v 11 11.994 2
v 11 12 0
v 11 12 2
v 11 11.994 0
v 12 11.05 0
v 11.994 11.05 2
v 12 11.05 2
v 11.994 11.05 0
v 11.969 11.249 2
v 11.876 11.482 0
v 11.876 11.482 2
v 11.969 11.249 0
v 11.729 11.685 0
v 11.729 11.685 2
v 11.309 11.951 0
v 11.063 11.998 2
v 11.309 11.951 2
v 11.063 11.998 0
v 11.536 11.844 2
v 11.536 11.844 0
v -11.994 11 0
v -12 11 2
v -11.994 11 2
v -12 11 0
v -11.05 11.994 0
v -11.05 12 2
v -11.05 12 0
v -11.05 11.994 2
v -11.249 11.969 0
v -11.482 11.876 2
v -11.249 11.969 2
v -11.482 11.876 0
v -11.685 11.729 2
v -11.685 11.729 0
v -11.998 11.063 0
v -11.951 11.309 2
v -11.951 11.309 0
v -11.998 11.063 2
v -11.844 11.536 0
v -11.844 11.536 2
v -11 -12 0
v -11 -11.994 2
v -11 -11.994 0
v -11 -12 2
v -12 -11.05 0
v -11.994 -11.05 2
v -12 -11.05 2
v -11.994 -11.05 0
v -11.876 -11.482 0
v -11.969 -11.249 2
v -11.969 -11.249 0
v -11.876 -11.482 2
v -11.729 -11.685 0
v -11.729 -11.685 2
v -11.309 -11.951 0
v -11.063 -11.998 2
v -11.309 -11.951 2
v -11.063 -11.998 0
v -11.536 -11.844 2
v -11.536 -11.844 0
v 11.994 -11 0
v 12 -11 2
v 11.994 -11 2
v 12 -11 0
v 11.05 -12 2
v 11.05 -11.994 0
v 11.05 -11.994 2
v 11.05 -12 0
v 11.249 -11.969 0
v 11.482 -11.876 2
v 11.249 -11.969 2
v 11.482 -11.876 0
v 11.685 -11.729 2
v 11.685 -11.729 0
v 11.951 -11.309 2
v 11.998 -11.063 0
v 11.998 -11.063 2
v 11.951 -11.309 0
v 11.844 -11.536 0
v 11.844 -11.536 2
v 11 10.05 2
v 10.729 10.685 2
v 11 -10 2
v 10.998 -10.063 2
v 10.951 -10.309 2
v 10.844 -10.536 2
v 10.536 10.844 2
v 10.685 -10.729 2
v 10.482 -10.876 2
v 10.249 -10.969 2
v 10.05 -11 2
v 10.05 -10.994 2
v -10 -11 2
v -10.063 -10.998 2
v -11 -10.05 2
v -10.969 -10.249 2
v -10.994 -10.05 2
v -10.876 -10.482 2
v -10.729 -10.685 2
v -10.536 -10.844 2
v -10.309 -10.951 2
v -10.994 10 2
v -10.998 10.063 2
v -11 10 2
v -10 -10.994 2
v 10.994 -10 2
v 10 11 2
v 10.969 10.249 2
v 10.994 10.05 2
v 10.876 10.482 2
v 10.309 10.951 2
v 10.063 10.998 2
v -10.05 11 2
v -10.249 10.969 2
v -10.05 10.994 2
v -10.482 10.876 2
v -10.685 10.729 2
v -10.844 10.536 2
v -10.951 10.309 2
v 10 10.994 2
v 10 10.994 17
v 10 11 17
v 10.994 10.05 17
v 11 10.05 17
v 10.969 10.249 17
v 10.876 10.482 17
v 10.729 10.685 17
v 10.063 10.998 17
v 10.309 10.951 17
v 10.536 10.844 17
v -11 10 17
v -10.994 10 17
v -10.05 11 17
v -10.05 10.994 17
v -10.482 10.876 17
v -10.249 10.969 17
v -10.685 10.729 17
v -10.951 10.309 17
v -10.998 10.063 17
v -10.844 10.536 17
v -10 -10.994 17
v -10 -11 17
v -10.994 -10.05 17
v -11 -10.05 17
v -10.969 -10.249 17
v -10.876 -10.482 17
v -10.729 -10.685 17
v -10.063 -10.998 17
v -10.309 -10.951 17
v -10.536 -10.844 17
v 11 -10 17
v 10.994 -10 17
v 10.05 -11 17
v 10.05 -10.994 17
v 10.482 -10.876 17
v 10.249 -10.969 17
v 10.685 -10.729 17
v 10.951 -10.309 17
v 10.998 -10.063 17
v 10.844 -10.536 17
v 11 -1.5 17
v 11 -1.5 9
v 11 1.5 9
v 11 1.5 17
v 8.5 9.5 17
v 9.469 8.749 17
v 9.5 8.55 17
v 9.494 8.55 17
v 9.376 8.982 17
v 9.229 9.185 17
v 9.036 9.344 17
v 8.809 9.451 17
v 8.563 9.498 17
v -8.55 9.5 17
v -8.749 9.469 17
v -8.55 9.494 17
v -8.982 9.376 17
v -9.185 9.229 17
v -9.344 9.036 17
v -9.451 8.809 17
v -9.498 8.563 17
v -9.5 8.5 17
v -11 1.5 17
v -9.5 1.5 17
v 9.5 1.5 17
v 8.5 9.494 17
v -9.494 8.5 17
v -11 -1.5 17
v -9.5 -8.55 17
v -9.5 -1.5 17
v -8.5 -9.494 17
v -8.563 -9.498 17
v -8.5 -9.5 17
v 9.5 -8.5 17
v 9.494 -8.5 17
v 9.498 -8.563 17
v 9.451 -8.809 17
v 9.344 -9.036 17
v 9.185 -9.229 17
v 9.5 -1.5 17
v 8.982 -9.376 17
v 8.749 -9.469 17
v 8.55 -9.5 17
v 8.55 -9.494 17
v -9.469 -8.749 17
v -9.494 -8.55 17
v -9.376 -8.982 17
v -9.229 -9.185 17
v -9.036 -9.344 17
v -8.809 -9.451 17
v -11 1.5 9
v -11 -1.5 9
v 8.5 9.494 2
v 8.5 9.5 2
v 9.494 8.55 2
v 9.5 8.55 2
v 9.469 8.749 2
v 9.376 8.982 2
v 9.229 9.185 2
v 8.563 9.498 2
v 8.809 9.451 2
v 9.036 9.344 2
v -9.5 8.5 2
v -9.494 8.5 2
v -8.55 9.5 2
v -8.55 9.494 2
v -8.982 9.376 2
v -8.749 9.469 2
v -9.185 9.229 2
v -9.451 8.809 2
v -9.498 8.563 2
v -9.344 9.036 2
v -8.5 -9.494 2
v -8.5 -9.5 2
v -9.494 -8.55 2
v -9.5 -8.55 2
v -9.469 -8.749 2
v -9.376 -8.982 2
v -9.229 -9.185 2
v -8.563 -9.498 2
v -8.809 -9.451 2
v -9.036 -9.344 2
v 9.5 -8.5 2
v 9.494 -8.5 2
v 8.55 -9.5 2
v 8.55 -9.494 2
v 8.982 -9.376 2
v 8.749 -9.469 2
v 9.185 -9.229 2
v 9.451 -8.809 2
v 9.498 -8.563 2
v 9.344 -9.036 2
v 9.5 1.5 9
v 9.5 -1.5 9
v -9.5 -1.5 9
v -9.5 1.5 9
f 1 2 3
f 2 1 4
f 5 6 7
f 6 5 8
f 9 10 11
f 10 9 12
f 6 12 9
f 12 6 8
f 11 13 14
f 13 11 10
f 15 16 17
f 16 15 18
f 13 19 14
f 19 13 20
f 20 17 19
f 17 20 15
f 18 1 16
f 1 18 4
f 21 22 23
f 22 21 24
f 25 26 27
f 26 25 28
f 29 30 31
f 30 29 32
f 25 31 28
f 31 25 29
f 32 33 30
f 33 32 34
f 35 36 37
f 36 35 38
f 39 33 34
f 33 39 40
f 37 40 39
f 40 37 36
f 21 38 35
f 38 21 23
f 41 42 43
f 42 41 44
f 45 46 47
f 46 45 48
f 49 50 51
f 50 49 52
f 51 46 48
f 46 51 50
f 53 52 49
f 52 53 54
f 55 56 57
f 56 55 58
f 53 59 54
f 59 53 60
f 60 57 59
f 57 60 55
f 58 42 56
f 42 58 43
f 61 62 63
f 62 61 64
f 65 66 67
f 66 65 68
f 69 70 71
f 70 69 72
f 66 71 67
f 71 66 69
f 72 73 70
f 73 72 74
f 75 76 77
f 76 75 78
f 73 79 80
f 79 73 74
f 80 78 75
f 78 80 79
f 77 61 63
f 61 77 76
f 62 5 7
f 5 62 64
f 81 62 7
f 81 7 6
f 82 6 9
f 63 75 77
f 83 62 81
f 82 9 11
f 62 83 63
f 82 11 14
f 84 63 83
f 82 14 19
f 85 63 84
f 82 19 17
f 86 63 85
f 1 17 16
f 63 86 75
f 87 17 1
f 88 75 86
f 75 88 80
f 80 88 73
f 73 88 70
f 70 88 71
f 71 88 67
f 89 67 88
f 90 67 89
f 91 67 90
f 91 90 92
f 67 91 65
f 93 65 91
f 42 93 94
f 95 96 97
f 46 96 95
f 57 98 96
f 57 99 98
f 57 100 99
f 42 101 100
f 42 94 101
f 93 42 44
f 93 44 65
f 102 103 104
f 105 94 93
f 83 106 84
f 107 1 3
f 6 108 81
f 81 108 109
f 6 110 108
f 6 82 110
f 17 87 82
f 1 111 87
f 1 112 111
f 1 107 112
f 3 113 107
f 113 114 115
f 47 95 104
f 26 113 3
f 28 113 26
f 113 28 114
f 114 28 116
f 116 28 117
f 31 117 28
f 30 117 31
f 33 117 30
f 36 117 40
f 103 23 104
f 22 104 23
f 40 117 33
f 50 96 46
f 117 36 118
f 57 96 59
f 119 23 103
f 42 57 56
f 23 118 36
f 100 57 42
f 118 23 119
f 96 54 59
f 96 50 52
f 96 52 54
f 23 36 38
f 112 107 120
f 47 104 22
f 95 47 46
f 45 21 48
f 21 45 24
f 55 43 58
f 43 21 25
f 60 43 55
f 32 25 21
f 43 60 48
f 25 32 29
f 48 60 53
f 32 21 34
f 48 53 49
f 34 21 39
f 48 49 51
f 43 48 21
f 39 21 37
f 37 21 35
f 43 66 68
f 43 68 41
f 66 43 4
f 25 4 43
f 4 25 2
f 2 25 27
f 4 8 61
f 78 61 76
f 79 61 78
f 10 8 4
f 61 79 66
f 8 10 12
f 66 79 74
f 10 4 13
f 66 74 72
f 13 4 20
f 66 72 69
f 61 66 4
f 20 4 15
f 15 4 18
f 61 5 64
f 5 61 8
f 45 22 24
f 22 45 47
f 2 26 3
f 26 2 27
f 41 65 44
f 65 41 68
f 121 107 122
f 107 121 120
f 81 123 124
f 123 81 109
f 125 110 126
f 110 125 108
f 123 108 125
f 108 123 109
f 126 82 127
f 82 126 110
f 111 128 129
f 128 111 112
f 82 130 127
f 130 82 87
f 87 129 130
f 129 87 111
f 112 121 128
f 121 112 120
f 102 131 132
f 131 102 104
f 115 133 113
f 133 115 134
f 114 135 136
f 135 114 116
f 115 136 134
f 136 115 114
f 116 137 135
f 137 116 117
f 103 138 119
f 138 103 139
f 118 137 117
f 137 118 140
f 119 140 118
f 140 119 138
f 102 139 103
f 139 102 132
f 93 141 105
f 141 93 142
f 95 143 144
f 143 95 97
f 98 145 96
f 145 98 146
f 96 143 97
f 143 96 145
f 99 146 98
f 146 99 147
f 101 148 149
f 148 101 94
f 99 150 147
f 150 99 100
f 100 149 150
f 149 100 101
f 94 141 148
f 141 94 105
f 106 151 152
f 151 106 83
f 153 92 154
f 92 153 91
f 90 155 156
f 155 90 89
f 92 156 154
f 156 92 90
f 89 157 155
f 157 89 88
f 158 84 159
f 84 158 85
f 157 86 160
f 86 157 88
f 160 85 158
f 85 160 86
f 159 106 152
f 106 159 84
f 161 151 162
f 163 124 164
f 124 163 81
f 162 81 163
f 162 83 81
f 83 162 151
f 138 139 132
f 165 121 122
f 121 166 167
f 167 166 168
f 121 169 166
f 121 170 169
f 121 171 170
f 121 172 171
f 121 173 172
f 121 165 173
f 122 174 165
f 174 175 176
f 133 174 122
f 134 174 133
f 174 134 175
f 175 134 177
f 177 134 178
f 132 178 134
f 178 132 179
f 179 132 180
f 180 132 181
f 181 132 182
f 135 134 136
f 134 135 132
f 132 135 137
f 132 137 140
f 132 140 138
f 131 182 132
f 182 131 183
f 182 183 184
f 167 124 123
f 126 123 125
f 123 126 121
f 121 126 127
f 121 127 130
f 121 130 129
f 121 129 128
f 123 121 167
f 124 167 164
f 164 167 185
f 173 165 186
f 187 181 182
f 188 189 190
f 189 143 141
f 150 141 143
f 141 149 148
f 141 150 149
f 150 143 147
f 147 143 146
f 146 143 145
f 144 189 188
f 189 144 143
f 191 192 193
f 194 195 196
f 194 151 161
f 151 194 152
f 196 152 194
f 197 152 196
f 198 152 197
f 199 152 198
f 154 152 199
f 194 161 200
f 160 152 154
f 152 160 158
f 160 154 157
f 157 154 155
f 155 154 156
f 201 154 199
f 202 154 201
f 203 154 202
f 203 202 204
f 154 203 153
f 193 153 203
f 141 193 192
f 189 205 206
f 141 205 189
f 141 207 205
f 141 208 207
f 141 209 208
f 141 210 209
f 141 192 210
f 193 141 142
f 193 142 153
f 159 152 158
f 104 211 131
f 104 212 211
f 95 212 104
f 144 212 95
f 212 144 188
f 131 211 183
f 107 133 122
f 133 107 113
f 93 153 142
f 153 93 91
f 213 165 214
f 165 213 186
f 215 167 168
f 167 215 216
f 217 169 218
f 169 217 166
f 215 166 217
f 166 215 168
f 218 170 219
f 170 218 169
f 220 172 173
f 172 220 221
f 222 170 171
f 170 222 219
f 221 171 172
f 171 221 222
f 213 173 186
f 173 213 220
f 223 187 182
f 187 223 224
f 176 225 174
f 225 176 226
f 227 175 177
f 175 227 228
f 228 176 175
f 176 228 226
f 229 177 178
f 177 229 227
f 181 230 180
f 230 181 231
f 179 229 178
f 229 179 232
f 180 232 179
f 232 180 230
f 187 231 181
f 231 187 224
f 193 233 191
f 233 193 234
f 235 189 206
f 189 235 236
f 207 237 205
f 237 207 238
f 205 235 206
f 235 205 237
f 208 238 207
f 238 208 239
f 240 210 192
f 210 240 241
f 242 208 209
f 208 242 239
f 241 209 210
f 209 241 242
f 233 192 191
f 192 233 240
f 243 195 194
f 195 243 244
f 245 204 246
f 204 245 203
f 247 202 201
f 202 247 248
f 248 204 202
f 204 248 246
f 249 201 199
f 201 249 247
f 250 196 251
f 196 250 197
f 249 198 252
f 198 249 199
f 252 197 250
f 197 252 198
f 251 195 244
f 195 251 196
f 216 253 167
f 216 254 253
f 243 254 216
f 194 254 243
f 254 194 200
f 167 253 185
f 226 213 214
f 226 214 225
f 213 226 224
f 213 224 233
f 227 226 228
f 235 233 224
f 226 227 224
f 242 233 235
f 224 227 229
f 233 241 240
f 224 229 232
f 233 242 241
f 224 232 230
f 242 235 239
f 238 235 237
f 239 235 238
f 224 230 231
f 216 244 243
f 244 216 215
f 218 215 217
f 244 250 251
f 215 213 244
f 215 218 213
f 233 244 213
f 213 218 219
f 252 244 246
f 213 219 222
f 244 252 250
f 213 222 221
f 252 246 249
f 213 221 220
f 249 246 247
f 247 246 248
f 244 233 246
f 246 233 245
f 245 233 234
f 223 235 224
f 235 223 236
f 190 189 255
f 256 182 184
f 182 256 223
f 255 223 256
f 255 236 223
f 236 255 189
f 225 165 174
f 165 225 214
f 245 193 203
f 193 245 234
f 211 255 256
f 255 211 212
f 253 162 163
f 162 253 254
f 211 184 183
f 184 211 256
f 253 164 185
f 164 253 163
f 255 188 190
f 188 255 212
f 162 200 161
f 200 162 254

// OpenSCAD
/*
http://codeviewer.org/view/code:1b36 
Copyright (C) 2011 Sergio Vilches
This program is free software: you can redistribute it and/or modify it under the terms of the GNU General Public License as published by the Free Software Foundation, either version 3 of the License, or (at your option) any later version.
This program is distributed in the hope that it will be useful, but WITHOUT ANY WARRANTY; without even the implied warranty of MERCHANTABILITY or FITNESS FOR A PARTICULAR PURPOSE. See the GNU General Public License for more details. You should have received a copy of the GNU General Public License along with this program. If not, see <http://www.gnu.org/licenses/>.
Contact: s.vilches.e@gmail.com


    ----------------------------------------------------------- 
                 Round Corners Cube (Extruded)                
      roundCornersCube(x,y,z,r) Where:                        
         - x = Xdir width                                     
         - y = Ydir width                                     
         - z = Height of the cube                             
         - r = Rounding radious                               
                                                              
      Example: roundCornerCube(10,10,2,1);                    
     *Some times it's needed to use F6 to see good results!   
 	 ----------------------------------------------------------- 
*/
// Test it!
// roundCornersCube(10,5,2,1);


module createMeniscus(h,radius) // This module creates the shape that needs to be substracted from a cube to make its corners rounded.
difference(){        //This shape is basicly the difference between a quarter of cylinder and a cube
   translate([radius/2+0.1,radius/2+0.1,0]){
      cube([radius+0.2,radius+0.1,h+0.2],center=true);         // All that 0.x numbers are to avoid "ghost boundaries" when substracting
   }

   cylinder(h=h+0.2,r=radius,$fn = 25,center=true);
}


module roundCornersCube(x,y,z,r)  // Now we just substract the shape we have created in the four corners
difference(){
   cube([x,y,z], center=true);

translate([x/2-r,y/2-r]){  // We move to the first corner (x,y)
      rotate(0){  
         createMeniscus(z,r); // And substract the meniscus
      }
   }
   translate([-x/2+r,y/2-r]){ // To the second corner (-x,y)
      rotate(90){
         createMeniscus(z,r); // But this time we have to rotate the meniscus 90 deg
      }
   }
      translate([-x/2+r,-y/2+r]){ // ... 
      rotate(180){
         createMeniscus(z,r);
      }
   }
      translate([x/2-r,-y/2+r]){
      rotate(270){
         createMeniscus(z,r);
      }
   }
}


bar_dia = 24;
wall_thick = 2;
plug_length = 15;
slot_height = 8;
slot_width = 3;

difference(){
union(){
translate([0,0,1]) roundCornersCube(bar_dia,bar_dia,2,1);
translate([0,0,(plug_length/2) + 2]) roundCornersCube(bar_dia - wall_thick,bar_dia - wall_thick,plug_length,1);
}
translate([0,0,(plug_length/2) + 2]) roundCornersCube(bar_dia - wall_thick - 3,bar_dia - wall_thick - 3,plug_length,1);
translate([-bar_dia/2,-(slot_width/2),(plug_length-slot_height)+2]) cube([bar_dia,slot_width,slot_height]);
}
